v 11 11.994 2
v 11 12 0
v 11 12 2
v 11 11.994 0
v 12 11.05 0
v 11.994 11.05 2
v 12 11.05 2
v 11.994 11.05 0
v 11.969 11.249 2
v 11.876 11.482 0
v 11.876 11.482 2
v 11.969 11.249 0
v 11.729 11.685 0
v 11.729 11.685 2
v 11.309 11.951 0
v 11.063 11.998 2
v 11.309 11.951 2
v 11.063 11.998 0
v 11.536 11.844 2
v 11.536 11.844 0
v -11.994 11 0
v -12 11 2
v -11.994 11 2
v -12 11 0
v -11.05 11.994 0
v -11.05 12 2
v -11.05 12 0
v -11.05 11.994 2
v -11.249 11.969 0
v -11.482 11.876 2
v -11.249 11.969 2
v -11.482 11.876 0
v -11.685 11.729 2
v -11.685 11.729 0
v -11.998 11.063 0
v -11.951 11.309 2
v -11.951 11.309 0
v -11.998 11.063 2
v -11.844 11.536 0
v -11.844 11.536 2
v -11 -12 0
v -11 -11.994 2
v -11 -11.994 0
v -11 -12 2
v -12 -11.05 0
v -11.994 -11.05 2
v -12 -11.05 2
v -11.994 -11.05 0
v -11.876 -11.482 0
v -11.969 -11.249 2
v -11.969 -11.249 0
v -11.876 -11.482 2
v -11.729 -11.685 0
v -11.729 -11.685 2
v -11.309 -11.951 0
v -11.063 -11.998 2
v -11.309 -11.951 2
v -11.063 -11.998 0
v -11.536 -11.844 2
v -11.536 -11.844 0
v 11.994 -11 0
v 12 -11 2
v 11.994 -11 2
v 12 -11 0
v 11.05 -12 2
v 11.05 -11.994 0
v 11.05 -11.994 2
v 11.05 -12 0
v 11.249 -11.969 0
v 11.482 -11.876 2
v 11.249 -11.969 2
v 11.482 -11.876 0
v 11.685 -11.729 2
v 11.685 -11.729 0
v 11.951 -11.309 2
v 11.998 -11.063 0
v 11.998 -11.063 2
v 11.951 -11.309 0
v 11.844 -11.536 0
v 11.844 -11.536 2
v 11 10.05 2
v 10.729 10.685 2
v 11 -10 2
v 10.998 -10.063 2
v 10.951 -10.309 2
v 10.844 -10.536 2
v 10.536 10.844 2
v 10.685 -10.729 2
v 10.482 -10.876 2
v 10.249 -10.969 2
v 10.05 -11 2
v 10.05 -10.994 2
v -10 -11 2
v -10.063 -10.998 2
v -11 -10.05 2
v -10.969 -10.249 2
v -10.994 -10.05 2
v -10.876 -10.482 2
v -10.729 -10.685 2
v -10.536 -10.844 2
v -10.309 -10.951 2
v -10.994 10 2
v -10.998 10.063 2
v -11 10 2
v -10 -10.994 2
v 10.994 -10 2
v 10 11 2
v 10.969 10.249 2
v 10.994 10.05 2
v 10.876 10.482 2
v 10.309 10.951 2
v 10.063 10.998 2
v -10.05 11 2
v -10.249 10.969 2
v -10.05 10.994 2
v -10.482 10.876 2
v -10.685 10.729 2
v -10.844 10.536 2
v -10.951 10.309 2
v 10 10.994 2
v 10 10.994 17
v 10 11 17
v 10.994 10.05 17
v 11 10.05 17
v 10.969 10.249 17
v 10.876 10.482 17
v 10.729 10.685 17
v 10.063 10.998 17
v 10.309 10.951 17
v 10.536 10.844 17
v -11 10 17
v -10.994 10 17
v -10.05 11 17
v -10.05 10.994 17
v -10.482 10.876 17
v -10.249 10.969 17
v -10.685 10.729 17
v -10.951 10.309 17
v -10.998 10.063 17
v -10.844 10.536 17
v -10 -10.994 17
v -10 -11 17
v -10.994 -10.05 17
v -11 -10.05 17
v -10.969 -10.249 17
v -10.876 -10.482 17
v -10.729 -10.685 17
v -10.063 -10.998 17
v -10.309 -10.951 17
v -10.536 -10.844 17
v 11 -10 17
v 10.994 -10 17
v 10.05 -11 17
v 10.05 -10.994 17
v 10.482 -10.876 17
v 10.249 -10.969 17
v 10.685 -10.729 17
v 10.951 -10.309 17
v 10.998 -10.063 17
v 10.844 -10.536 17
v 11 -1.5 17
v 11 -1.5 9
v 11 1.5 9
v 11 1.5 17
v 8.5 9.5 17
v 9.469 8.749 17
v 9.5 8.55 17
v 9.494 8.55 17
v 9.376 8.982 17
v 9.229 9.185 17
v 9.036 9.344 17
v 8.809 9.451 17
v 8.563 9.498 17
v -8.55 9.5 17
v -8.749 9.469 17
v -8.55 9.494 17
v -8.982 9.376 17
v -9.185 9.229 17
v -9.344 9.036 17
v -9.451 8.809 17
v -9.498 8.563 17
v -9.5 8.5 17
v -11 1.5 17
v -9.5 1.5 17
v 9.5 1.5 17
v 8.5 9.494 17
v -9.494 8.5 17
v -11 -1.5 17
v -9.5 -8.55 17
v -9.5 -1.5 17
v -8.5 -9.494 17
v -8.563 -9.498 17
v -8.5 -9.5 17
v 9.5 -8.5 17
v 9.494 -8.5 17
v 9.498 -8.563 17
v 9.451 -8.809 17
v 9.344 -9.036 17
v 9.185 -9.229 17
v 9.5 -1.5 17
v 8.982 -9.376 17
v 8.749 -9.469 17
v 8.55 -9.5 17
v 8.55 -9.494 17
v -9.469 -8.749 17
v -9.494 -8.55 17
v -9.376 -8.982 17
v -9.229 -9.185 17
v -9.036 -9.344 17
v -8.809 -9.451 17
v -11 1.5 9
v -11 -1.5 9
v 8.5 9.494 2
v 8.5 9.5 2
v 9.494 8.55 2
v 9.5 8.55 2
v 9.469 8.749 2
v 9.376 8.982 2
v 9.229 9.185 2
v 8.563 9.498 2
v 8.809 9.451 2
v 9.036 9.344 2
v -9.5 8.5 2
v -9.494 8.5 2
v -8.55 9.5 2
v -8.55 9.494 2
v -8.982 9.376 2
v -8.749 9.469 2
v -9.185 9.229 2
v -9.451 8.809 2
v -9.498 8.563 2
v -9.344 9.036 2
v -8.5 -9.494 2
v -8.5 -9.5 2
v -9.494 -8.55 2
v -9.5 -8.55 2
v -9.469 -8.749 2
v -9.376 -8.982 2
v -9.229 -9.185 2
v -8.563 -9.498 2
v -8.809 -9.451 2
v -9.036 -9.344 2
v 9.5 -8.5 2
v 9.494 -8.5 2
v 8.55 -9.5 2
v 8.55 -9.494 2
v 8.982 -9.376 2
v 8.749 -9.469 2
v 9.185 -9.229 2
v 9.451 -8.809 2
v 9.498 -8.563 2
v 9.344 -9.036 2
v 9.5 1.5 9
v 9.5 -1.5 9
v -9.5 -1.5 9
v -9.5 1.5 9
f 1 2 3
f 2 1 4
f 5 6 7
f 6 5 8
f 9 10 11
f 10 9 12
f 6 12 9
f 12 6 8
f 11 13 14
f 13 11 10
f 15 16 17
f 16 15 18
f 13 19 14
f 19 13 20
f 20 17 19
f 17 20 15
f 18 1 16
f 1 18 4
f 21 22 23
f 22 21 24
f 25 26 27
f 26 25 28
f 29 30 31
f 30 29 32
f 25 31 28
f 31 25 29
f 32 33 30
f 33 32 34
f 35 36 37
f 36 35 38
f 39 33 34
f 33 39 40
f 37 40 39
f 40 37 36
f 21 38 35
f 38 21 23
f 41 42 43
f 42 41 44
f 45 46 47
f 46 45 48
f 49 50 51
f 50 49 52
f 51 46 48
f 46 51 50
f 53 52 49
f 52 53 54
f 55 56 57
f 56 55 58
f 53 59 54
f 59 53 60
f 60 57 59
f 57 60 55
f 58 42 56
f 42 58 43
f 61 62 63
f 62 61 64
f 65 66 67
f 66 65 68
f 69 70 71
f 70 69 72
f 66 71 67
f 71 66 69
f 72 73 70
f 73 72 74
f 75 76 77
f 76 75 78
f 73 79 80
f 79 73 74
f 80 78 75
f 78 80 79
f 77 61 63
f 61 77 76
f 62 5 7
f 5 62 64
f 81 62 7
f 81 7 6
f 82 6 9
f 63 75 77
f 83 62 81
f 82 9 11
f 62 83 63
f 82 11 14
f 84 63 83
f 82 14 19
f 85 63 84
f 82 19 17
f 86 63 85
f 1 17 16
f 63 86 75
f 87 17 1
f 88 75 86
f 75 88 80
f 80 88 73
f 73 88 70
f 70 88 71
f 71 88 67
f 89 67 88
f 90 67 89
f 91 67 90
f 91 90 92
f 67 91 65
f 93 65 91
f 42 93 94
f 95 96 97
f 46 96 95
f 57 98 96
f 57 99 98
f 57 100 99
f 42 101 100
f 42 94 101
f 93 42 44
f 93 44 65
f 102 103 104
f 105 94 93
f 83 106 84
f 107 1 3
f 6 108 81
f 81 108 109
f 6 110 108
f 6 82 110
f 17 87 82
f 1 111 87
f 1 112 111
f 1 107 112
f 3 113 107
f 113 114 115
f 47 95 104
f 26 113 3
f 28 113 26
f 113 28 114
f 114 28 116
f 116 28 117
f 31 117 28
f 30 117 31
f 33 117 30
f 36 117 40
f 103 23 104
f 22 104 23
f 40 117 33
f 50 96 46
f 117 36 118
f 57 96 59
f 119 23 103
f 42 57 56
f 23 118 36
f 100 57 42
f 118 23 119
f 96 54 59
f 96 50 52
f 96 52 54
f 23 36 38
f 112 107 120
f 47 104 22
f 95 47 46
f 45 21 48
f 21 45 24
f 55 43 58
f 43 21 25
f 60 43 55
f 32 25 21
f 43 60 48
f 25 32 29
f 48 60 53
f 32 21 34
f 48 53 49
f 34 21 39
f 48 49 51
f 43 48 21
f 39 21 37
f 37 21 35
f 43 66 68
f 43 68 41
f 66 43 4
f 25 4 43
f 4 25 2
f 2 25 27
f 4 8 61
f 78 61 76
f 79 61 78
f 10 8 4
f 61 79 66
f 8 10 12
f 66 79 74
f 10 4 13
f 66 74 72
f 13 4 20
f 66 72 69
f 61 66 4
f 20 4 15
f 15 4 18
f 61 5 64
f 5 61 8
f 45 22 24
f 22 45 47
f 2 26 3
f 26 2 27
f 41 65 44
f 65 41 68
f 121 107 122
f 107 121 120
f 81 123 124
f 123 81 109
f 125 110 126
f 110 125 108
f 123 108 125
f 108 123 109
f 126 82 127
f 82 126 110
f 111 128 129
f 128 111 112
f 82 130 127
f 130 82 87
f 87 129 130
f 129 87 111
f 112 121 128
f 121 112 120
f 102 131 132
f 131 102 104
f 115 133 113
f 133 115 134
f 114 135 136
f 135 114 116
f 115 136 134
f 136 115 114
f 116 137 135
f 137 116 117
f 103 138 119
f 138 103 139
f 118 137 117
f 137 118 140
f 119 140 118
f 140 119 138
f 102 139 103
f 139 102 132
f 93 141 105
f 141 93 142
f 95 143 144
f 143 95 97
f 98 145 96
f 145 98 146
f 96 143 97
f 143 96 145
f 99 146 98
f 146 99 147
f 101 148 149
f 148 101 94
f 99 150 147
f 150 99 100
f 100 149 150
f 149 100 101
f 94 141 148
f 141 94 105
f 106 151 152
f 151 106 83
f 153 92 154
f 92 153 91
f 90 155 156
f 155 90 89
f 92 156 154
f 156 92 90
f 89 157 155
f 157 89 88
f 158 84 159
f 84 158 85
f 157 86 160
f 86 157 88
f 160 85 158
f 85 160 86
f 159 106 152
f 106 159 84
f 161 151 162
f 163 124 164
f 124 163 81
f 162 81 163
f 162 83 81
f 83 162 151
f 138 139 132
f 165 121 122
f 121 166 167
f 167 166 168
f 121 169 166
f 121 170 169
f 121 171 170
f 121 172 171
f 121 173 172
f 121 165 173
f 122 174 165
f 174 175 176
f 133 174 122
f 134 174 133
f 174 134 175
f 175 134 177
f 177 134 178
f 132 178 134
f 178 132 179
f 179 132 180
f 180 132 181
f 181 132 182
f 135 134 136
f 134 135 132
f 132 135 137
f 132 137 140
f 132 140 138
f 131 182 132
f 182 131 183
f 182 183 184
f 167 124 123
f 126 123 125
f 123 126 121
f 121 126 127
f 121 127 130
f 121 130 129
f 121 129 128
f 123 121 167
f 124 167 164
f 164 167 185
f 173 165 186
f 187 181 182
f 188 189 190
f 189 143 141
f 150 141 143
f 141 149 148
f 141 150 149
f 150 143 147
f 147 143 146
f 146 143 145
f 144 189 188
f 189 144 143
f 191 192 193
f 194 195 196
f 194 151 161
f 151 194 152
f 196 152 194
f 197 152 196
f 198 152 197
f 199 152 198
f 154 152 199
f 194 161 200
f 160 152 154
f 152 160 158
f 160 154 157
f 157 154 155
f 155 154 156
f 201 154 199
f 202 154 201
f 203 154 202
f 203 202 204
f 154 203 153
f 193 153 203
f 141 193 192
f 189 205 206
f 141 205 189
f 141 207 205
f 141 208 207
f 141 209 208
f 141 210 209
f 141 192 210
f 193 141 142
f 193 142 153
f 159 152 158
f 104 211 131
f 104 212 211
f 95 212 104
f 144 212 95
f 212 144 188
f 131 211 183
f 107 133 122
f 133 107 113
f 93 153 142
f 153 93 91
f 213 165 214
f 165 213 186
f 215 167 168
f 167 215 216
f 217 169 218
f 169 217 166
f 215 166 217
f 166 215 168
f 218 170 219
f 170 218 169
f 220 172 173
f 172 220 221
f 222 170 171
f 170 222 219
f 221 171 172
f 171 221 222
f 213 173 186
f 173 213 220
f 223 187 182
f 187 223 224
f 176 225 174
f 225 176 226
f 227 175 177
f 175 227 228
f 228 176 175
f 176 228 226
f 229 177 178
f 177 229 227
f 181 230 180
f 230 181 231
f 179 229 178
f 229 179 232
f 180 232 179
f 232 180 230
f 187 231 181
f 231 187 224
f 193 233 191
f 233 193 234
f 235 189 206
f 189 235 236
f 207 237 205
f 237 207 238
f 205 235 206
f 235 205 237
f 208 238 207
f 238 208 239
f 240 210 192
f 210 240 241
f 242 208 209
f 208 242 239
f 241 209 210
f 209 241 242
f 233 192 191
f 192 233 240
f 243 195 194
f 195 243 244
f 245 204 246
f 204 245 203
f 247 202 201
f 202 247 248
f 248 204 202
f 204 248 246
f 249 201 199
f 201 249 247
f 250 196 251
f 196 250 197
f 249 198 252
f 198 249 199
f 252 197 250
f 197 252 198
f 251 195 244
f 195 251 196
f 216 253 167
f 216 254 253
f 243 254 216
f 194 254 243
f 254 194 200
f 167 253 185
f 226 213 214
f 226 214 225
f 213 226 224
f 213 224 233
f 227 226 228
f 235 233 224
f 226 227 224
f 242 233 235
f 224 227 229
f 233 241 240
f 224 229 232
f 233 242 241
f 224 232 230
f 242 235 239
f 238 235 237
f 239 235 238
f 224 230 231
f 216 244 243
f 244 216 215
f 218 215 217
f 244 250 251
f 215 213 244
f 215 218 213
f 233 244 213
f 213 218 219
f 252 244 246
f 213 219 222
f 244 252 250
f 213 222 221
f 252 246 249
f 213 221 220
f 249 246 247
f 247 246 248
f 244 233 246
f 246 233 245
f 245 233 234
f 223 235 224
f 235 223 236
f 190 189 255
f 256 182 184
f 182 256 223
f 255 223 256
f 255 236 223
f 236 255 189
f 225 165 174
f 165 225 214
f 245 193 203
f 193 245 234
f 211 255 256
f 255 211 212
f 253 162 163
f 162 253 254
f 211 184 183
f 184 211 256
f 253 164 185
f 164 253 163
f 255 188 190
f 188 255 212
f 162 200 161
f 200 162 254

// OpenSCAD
/*
http://codeviewer.org/view/code:1b36 
Copyright (C) 2011 Sergio Vilches
This program is free software: you can redistribute it and/or modify it under the terms of the GNU General Public License as published by the Free Software Foundation, either version 3 of the License, or (at your option) any later version.
This program is distributed in the hope that it will be useful, but WITHOUT ANY WARRANTY; without even the implied warranty of MERCHANTABILITY or FITNESS FOR A PARTICULAR PURPOSE. See the GNU General Public License for more details. You should have received a copy of the GNU General Public License along with this program. If not, see <http://www.gnu.org/licenses/>.
Contact: s.vilches.e@gmail.com


    ----------------------------------------------------------- 
                 Round Corners Cube (Extruded)                
      roundCornersCube(x,y,z,r) Where:                        
         - x = Xdir width                                     
         - y = Ydir width                                     
         - z = Height of the cube                             
         - r = Rounding radious                               
                                                              
      Example: roundCornerCube(10,10,2,1);                    
     *Some times it's needed to use F6 to see good results!   
 	 ----------------------------------------------------------- 
*/
// Test it!
// roundCornersCube(10,5,2,1);


module createMeniscus(h,radius) // This module creates the shape that needs to be substracted from a cube to make its corners rounded.
difference(){        //This shape is basicly the difference between a quarter of cylinder and a cube
   translate([radius/2+0.1,radius/2+0.1,0]){
      cube([radius+0.2,radius+0.1,h+0.2],center=true);         // All that 0.x numbers are to avoid "ghost boundaries" when substracting
   }

   cylinder(h=h+0.2,r=radius,$fn = 25,center=true);
}


module roundCornersCube(x,y,z,r)  // Now we just substract the shape we have created in the four corners
difference(){
   cube([x,y,z], center=true);

translate([x/2-r,y/2-r]){  // We move to the first corner (x,y)
      rotate(0){  
         createMeniscus(z,r); // And substract the meniscus
      }
   }
   translate([-x/2+r,y/2-r]){ // To the second corner (-x,y)
      rotate(90){
         createMeniscus(z,r); // But this time we have to rotate the meniscus 90 deg
      }
   }
      translate([-x/2+r,-y/2+r]){ // ... 
      rotate(180){
         createMeniscus(z,r);
      }
   }
      translate([x/2-r,-y/2+r]){
      rotate(270){
         createMeniscus(z,r);
      }
   }
}


bar_dia = 24;
wall_thick = 2;
plug_length = 15;
slot_height = 8;
slot_width = 3;

difference(){
union(){
translate([0,0,1]) roundCornersCube(bar_dia,bar_dia,2,1);
translate([0,0,(plug_length/2) + 2]) roundCornersCube(bar_dia - wall_thick,bar_dia - wall_thick,plug_length,1);
}
translate([0,0,(plug_length/2) + 2]) roundCornersCube(bar_dia - wall_thick - 3,bar_dia - wall_thick - 3,plug_length,1);
translate([-bar_dia/2,-(slot_width/2),(plug_length-slot_height)+2]) cube([bar_dia,slot_width,slot_height]);
}
